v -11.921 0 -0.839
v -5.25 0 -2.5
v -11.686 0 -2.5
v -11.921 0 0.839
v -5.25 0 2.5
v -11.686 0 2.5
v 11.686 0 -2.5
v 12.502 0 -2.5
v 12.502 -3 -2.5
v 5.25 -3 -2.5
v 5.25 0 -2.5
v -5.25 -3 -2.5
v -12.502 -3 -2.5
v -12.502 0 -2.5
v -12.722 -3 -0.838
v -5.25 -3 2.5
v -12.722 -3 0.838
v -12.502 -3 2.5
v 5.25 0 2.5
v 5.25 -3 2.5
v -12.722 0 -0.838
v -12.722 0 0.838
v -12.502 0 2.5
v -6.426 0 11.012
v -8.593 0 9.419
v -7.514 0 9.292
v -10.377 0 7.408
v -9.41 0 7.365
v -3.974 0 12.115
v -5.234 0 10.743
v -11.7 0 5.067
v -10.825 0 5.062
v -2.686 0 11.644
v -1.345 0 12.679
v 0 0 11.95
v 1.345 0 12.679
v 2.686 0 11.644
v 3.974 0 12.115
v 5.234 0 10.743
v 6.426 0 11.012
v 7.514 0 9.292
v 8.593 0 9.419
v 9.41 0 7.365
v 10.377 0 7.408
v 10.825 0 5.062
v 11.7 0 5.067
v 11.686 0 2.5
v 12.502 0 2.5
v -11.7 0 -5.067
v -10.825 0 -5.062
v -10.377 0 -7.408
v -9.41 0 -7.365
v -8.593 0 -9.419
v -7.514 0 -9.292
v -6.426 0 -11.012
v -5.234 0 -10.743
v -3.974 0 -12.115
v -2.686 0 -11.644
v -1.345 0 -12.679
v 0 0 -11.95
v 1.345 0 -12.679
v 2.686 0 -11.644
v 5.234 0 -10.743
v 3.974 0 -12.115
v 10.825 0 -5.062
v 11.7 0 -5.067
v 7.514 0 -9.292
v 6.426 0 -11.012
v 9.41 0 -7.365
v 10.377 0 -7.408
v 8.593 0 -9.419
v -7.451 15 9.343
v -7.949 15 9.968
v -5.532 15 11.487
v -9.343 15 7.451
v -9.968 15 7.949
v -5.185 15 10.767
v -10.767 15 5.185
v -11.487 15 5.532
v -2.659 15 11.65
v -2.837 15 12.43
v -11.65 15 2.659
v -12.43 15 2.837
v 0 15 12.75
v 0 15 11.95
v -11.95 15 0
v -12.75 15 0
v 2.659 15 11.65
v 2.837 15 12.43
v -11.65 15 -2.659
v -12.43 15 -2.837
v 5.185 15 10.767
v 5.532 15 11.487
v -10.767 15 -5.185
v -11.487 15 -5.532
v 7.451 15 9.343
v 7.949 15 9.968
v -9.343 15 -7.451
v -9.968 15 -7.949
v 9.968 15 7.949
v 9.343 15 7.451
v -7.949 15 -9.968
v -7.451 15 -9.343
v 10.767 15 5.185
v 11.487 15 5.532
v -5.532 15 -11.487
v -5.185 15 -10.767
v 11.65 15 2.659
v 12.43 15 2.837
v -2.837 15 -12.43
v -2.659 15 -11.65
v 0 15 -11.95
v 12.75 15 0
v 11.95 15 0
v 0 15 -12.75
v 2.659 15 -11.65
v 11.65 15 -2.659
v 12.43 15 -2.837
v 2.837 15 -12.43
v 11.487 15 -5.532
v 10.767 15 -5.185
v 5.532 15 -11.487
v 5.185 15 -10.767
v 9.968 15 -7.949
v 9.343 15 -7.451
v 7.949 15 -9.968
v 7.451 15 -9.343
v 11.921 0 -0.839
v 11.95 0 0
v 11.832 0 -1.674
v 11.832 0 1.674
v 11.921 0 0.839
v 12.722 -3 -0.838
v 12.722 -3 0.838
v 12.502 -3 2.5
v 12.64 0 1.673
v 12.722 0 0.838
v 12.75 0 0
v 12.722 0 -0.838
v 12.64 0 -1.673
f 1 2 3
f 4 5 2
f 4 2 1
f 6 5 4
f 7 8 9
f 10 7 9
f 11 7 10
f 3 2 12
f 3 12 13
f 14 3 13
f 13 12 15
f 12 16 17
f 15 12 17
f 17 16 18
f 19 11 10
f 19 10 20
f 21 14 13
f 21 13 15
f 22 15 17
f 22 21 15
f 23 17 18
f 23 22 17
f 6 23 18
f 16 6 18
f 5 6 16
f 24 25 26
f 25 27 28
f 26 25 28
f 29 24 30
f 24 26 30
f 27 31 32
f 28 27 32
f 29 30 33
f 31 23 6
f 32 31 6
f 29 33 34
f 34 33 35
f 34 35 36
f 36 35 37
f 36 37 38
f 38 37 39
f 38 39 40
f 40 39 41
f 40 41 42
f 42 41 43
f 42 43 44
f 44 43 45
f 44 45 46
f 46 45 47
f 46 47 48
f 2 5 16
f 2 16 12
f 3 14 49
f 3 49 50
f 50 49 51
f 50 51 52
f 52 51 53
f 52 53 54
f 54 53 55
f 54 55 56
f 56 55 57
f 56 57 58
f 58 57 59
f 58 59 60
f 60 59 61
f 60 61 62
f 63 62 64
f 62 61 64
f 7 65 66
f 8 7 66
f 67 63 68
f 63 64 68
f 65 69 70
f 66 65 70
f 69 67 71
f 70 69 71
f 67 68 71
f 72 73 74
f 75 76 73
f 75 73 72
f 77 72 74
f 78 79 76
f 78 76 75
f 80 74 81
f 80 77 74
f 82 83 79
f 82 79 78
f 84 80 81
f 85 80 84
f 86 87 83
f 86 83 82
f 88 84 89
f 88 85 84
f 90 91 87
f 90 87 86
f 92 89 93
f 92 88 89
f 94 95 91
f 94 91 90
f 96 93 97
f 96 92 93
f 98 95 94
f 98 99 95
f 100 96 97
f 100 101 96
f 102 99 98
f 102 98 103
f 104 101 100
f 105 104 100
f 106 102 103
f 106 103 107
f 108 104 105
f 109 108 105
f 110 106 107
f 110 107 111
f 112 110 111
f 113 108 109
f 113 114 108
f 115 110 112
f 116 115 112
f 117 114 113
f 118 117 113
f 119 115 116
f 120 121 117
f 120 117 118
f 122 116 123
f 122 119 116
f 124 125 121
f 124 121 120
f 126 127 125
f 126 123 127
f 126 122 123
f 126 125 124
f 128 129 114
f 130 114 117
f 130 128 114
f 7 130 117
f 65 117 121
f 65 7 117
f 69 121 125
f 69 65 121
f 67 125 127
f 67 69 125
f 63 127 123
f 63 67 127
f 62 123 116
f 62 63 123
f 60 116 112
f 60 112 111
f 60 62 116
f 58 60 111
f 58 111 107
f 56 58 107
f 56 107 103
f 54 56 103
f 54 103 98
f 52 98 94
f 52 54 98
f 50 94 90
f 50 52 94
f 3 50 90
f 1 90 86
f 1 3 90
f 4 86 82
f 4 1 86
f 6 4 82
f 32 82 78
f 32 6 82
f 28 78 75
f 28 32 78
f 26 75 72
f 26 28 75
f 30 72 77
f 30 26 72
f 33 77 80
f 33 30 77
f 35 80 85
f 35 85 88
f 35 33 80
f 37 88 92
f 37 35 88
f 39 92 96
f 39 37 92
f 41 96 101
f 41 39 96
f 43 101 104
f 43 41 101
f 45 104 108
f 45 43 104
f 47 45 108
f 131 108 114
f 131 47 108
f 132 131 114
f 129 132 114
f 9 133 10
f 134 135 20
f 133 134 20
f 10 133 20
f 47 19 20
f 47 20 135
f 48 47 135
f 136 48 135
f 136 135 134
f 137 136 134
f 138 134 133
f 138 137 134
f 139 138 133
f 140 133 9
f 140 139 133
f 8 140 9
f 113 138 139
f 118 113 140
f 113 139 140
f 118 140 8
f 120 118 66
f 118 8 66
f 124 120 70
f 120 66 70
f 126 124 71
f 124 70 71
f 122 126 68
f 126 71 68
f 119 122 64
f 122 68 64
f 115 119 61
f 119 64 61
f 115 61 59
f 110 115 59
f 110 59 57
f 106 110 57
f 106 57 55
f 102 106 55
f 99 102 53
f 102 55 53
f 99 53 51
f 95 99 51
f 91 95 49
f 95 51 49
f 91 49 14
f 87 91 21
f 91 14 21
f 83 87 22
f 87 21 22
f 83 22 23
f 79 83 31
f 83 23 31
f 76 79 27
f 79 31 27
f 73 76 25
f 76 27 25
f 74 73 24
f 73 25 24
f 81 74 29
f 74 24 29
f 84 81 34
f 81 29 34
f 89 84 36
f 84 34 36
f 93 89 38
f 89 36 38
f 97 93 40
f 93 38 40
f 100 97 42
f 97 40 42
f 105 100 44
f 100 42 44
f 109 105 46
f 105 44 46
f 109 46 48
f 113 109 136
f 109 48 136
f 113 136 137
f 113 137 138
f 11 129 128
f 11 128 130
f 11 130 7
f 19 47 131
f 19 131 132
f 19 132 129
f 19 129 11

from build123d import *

# Parameters (mm, degrees)
SKETCH2_R           = 12.75
SKETCH2_R_2         = 11.95
BOSS_EXTRUDE1_DEPTH = 15
BOSS_EXTRUDE2_DEPTH = 3


with BuildPart() as part:
    # Sketch2 → Boss-Extrude1 (new body)
    with BuildSketch(Plane(origin=(0, 0, 0), x_dir=(1, 0, 0), z_dir=(0, 1, 0))):
        Circle(SKETCH2_R)
        Circle(SKETCH2_R_2, mode=Mode.SUBTRACT)
    extrude(amount=BOSS_EXTRUDE1_DEPTH)

    # Sketch3 → Boss-Extrude2 (add)
    with BuildSketch(Plane.XZ):
        with BuildLine():
            Line((5.25, -2.5), (5.25, 2.5))
            Line((5.25, 2.5), (12.5025, 2.5))
            ThreePointArc((12.5025, 2.5), (12.75, 0), (12.5025, -2.5))
            Line((12.5025, -2.5), (5.25, -2.5))
        make_face()
        with BuildLine():
            Line((-5.25, -2.5), (-12.5025, -2.5))
            ThreePointArc((-12.5025, -2.5), (-12.75, 0), (-12.5025, 2.5))
            Line((-12.5025, 2.5), (-5.25, 2.5))
            Line((-5.25, 2.5), (-5.25, -2.5))
        make_face()
    extrude(amount=BOSS_EXTRUDE2_DEPTH)


solid = part.part
